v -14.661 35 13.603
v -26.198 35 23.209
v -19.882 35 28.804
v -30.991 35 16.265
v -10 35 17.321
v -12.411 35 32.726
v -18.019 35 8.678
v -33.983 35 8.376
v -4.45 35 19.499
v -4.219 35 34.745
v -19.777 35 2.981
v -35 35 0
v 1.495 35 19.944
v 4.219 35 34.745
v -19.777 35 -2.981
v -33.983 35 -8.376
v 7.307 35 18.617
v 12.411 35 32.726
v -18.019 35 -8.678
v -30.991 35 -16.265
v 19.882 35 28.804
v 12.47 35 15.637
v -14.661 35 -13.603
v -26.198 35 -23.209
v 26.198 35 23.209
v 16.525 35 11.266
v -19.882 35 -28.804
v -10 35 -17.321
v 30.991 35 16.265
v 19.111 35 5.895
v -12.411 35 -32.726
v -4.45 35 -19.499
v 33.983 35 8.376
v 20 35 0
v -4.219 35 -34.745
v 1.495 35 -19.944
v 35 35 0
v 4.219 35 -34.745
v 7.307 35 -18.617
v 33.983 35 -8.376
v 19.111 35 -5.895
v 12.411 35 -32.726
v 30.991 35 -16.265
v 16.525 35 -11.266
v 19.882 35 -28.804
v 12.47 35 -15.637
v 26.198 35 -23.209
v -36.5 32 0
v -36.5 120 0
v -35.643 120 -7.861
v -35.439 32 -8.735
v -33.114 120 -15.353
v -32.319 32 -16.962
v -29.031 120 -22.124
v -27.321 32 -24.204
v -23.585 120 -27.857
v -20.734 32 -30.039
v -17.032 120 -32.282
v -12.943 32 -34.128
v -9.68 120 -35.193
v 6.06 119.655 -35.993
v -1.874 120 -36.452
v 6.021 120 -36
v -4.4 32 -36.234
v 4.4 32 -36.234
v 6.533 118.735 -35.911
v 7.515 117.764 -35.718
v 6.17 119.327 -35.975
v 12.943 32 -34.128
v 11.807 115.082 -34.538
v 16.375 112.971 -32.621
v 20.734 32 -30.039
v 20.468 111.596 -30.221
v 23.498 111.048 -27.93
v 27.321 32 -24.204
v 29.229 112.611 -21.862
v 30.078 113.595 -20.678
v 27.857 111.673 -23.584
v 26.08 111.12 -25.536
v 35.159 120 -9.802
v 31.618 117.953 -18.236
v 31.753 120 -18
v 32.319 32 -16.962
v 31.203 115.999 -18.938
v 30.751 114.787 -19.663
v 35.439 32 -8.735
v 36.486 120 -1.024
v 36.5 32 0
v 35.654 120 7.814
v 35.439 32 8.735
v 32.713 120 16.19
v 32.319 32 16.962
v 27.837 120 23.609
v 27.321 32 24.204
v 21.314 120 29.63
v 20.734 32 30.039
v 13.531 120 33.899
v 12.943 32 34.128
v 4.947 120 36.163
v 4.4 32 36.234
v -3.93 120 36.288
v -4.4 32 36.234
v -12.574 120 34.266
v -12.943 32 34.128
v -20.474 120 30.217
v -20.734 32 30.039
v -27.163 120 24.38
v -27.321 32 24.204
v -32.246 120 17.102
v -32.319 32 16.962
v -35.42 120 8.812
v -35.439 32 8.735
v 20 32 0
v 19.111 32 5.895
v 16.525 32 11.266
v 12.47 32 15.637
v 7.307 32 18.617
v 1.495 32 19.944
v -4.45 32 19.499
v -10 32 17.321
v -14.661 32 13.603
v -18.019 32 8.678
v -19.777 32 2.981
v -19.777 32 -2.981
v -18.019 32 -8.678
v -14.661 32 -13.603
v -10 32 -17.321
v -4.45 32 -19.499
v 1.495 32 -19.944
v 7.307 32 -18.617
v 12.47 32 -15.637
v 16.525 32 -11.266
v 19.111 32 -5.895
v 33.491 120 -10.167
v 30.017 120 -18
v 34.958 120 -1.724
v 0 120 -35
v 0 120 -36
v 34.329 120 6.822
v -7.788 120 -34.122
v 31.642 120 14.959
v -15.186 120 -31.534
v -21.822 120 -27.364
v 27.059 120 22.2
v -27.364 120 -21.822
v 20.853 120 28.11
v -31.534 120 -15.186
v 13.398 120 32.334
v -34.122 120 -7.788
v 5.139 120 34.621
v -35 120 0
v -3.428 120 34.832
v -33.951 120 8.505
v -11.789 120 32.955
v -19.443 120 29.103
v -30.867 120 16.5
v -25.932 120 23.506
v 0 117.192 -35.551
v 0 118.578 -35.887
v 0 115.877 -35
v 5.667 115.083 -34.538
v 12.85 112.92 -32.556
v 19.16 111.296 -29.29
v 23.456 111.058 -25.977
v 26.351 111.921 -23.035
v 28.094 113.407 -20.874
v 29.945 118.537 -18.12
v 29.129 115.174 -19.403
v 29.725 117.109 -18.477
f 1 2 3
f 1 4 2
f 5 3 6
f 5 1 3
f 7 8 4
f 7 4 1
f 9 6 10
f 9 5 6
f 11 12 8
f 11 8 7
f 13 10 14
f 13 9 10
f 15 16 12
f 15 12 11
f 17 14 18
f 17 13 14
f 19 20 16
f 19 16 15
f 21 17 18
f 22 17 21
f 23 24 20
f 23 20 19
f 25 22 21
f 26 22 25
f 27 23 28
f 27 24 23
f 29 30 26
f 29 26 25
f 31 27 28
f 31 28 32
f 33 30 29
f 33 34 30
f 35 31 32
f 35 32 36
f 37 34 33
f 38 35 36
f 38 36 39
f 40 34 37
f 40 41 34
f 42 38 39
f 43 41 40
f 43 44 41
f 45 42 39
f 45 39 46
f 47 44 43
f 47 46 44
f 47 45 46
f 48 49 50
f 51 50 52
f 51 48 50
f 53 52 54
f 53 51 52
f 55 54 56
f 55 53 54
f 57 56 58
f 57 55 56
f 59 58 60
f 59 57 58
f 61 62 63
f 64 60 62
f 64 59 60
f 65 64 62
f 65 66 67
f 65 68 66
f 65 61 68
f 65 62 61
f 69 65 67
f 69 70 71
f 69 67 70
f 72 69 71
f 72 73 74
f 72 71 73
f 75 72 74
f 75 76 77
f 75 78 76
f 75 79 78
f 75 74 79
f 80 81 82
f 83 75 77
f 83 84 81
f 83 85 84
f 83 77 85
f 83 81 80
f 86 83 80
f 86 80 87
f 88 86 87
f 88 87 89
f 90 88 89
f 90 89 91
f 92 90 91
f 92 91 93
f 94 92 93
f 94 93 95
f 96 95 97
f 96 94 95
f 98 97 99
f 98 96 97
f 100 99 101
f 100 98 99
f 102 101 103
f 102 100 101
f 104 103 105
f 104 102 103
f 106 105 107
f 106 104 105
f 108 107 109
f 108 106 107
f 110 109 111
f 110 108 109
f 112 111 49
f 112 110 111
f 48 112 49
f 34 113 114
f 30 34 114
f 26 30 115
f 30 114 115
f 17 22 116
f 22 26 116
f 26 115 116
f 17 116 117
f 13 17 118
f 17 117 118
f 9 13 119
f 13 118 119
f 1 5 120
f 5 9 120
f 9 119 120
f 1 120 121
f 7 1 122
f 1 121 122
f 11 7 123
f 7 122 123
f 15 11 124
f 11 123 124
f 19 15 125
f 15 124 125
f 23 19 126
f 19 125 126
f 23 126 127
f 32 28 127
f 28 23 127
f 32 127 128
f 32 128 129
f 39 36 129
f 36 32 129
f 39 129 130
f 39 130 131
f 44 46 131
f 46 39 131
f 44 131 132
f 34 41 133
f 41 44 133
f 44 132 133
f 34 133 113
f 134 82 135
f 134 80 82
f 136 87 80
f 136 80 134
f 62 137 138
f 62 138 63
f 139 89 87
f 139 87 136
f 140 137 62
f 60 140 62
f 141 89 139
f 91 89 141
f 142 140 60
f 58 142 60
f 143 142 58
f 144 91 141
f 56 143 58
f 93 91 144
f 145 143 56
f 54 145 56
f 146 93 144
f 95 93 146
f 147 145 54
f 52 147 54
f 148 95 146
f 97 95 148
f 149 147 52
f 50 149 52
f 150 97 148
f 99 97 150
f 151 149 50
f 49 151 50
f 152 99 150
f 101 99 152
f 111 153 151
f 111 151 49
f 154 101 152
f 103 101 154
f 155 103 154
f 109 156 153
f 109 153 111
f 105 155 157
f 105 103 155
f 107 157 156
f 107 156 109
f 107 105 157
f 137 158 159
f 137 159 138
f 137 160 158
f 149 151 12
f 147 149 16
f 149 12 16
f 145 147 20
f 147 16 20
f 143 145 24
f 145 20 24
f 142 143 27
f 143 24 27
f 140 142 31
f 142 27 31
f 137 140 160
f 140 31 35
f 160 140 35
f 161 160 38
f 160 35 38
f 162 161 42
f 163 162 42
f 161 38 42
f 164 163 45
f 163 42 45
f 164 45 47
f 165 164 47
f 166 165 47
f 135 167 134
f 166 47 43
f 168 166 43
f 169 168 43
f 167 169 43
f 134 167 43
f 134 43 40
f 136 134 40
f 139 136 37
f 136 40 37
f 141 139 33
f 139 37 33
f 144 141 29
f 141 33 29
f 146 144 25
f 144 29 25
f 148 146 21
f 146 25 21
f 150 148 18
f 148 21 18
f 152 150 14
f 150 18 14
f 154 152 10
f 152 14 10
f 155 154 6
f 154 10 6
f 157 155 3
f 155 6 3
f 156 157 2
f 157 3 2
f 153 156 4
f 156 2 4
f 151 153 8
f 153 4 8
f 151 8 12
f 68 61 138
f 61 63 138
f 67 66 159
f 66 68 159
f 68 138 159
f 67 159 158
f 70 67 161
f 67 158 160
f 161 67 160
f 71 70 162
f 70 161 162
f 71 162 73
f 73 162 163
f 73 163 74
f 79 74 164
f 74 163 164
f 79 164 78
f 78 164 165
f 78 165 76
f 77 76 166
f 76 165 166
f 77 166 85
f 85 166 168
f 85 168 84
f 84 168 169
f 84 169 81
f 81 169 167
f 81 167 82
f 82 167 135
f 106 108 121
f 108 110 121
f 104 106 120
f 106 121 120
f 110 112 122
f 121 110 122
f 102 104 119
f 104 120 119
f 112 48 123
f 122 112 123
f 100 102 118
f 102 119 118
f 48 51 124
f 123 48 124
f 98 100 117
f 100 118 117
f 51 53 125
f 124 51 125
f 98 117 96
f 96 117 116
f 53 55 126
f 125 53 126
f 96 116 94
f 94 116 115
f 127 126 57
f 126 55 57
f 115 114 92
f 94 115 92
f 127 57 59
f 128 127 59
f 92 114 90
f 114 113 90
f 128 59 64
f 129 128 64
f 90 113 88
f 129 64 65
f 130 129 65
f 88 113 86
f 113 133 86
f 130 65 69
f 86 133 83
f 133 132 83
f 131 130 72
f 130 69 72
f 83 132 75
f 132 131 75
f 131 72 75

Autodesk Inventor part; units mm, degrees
sketch "Sketch1" plane through (0, 0, 0) normal (0, 1, 0) x (-1, 0, 0)
  circle A0 centre (0, 0) radius 36.5
  circle A1 centre (0, 0) radius 35
  dimension "d0" = 73
  dimension "d1" = 70
extrude "Extrusion1" add sketch "Sketch1" along normal blind 3 contours A0 | A1
extrude "Extrusion2" add sketch "Sketch1" along normal blind 120
sketch "Sketch2" plane through (0, 3, 0) normal (0, 1, 0) x (1, 0, 0)
  circle A0 centre (0, 0) radius 35 projected
  line L0 (-24.7487, -24.7487) -> (24.7487, -24.7487)
  line L1 (24.7487, -24.7487) -> (24.7487, 24.7487)
  line L2 (24.7487, 24.7487) -> (-24.7487, 24.7487)
  line L3 (-24.7487, 24.7487) -> (-24.7487, -24.7487)
  line L4 (-24.7487, -24.7487) -> (24.7487, 24.7487) construction
  line L5 (24.7487, -24.7487) -> (-24.7487, 24.7487) construction
extrude "Extrusion3" add sketch "Sketch2" along normal blind 2 contours L1 L0 L3 L2
sketch "Sketch3" plane through (0, 5, 0) normal (0, 1, 0) x (1, 0, 0)
  line L0 (21.1, -23.1) -> (-21.1, -23.1)
  line L1 (-23.1, -21.1) -> (-23.1, 21.1)
  line L2 (-21.1, 23.1) -> (21.1, 23.1)
  line L3 (23.1, 21.1) -> (23.1, -21.1)
  line L4 (23.1, -23.1) -> (-23.1, 23.1) construction
  line L5 (-23.1, -23.1) -> (23.1, 23.1) construction
  arc A0 (-23.1, -21.1) -> (-21.1, -23.1) centre (-21.1, -21.1) ccw
  arc A1 (21.1, -23.1) -> (23.1, -21.1) centre (21.1, -21.1) ccw
  arc A2 (23.1, 21.1) -> (21.1, 23.1) centre (21.1, 21.1) ccw
  arc A3 (-21.1, 23.1) -> (-23.1, 21.1) centre (-21.1, 21.1) ccw
  point P0 (0, 0)
  dimension "d11" = 46.2
  dimension "d12" = 46.2
  dimension "d13" = 2
extrude "Extrusion4" cut sketch "Sketch3" against normal blind 2
sketch "Sketch4" plane through (0, 0, 0) normal (1, 0, 0) x (0, 1, 0)
  line L0 (120, 35) -> (120, -35) projected
  line L1 (120, 0) -> (120, -19.5)
  line L2 (120, -19.5) -> (120, -27)
  circle A0 centre (120, -27) radius 9
  point P0 (0, 0)
  dimension "d16" = 19.5
  dimension "d17" = 7.5
  dimension "d18" = 18
extrude "Extrusion5" cut sketch "Sketch4" along normal through all
sketch "Sketch5" plane through (0, 0, 0) normal (0, -1, 0) x (1, 0, 0)
  line L0 (5, -36.1559) -> (5, -42.4125)
  line L1 (5, -42.4125) -> (-5, -42.4125)
  line L2 (-5, -42.4125) -> (-5, -36.1559)
  line L3 (-5, -30.5875) -> (5, -42.4125) construction
  line L4 (5, -30.5875) -> (-5, -42.4125) construction
  circle A0 centre (0, 0) radius 36.5 projected
  line L5 (8, -35.6125) -> (8, -42.4125)
  line L6 (8, -42.4125) -> (-8, -42.4125)
  line L7 (-8, -42.4125) -> (-8, -35.6125)
  line L8 (-8, -30.5875) -> (8, -42.4125) construction
  line L9 (8, -30.5875) -> (-8, -42.4125) construction
  circle A1 centre (0, 0) radius 36.5
  arc A2 (5, -36.1675) -> (4.9876, -36.1576) centre (0, -42.4125) ccw
  arc A3 (-4.9876, -36.1576) -> (-5, -36.1675) centre (0, -42.4125) ccw
  arc A4 (-8, -42.4125) -> (8, -42.4125) centre (0, -42.4125) ccw
  arc A5 (-5, -42.4125) -> (5, -42.4125) centre (0, -42.4125) ccw
  point P0 (0, -36.5)
  dimension "d21" = 10
  dimension "d22" = 36.5
  dimension "d23" = 16
extrude "Extrusion6" add sketch "Sketch5" against normal blind 6 contours A0 L5 L6 L0 | L6 A4 A5 | L6 L7 A0 L2
ref_plane "Work Plane2" through (36.5, 0, 0) normal (1, 0, 0) x (0, 1, 0)
sketch "Sketch8" plane through (36.5, 0, 0) normal (1, 0, 0) x (0, 1, 0)
  line L0 (8.45, 4.25) -> (21.55, 4.25)
  line L1 (21.55, 4.25) -> (21.55, -4.25)
  line L2 (21.55, -4.25) -> (8.45, -4.25)
  line L3 (8.45, -4.25) -> (8.45, 4.25)
  line L4 (8.45, 4.25) -> (21.55, -4.25) construction
  line L5 (21.55, 4.25) -> (8.45, -4.25) construction
  line L6 (7.5, 5.25) -> (22.5, 5.25)
  line L7 (22.5, 5.25) -> (22.5, -5.25)
  line L8 (22.5, -5.25) -> (7.5, -5.25)
  line L9 (7.5, -5.25) -> (7.5, 5.25)
  line L10 (7.5, 5.25) -> (22.5, -5.25) construction
  line L11 (22.5, 5.25) -> (7.5, -5.25) construction
  point P0 (0, 0)
  point P1 (15, 0)
  dimension "d38" = 13.1
  dimension "d39" = 8.5
  dimension "d40" = 0
  dimension "d41" = 15
  dimension "d42" = 10.5
  dimension "d43" = 15
extrude "Extrusion9" cut sketch "Sketch8" against normal blind 3 contours L0 L1 L2 L3
extrude "Extrusion10" cut sketch "Sketch8" against normal blind 1
ref_plane "Work Plane3" through (0, 93, 0) normal (0, 1, 0) x (1, 0, 0)
ref_plane "Work Plane5" through (0, 32, 0) normal (0, 1, 0) x (1, 0, 0)
sketch "Sketch13" plane through (0, 32, 0) normal (0, 1, 0) x (1, 0, 0)
  circle A0 centre (0, 0) radius 20
  line L0 (24.7487, 24.7487) -> (-24.7487, 24.7487) projected
  circle A1 centre (0, 0) radius 35
  dimension "d61" = 40
extrude "Extrusion14" add sketch "Sketch13" along normal blind 3
sketch "Sketch14" plane through (0, 32, 0) normal (0, 1, 0) x (1, 0, 0)
  circle A0 centre (0, 0) radius 50.5551
extrude "Extrusion15" cut sketch "Sketch14" against normal through all
properties part number "Outside holder"
